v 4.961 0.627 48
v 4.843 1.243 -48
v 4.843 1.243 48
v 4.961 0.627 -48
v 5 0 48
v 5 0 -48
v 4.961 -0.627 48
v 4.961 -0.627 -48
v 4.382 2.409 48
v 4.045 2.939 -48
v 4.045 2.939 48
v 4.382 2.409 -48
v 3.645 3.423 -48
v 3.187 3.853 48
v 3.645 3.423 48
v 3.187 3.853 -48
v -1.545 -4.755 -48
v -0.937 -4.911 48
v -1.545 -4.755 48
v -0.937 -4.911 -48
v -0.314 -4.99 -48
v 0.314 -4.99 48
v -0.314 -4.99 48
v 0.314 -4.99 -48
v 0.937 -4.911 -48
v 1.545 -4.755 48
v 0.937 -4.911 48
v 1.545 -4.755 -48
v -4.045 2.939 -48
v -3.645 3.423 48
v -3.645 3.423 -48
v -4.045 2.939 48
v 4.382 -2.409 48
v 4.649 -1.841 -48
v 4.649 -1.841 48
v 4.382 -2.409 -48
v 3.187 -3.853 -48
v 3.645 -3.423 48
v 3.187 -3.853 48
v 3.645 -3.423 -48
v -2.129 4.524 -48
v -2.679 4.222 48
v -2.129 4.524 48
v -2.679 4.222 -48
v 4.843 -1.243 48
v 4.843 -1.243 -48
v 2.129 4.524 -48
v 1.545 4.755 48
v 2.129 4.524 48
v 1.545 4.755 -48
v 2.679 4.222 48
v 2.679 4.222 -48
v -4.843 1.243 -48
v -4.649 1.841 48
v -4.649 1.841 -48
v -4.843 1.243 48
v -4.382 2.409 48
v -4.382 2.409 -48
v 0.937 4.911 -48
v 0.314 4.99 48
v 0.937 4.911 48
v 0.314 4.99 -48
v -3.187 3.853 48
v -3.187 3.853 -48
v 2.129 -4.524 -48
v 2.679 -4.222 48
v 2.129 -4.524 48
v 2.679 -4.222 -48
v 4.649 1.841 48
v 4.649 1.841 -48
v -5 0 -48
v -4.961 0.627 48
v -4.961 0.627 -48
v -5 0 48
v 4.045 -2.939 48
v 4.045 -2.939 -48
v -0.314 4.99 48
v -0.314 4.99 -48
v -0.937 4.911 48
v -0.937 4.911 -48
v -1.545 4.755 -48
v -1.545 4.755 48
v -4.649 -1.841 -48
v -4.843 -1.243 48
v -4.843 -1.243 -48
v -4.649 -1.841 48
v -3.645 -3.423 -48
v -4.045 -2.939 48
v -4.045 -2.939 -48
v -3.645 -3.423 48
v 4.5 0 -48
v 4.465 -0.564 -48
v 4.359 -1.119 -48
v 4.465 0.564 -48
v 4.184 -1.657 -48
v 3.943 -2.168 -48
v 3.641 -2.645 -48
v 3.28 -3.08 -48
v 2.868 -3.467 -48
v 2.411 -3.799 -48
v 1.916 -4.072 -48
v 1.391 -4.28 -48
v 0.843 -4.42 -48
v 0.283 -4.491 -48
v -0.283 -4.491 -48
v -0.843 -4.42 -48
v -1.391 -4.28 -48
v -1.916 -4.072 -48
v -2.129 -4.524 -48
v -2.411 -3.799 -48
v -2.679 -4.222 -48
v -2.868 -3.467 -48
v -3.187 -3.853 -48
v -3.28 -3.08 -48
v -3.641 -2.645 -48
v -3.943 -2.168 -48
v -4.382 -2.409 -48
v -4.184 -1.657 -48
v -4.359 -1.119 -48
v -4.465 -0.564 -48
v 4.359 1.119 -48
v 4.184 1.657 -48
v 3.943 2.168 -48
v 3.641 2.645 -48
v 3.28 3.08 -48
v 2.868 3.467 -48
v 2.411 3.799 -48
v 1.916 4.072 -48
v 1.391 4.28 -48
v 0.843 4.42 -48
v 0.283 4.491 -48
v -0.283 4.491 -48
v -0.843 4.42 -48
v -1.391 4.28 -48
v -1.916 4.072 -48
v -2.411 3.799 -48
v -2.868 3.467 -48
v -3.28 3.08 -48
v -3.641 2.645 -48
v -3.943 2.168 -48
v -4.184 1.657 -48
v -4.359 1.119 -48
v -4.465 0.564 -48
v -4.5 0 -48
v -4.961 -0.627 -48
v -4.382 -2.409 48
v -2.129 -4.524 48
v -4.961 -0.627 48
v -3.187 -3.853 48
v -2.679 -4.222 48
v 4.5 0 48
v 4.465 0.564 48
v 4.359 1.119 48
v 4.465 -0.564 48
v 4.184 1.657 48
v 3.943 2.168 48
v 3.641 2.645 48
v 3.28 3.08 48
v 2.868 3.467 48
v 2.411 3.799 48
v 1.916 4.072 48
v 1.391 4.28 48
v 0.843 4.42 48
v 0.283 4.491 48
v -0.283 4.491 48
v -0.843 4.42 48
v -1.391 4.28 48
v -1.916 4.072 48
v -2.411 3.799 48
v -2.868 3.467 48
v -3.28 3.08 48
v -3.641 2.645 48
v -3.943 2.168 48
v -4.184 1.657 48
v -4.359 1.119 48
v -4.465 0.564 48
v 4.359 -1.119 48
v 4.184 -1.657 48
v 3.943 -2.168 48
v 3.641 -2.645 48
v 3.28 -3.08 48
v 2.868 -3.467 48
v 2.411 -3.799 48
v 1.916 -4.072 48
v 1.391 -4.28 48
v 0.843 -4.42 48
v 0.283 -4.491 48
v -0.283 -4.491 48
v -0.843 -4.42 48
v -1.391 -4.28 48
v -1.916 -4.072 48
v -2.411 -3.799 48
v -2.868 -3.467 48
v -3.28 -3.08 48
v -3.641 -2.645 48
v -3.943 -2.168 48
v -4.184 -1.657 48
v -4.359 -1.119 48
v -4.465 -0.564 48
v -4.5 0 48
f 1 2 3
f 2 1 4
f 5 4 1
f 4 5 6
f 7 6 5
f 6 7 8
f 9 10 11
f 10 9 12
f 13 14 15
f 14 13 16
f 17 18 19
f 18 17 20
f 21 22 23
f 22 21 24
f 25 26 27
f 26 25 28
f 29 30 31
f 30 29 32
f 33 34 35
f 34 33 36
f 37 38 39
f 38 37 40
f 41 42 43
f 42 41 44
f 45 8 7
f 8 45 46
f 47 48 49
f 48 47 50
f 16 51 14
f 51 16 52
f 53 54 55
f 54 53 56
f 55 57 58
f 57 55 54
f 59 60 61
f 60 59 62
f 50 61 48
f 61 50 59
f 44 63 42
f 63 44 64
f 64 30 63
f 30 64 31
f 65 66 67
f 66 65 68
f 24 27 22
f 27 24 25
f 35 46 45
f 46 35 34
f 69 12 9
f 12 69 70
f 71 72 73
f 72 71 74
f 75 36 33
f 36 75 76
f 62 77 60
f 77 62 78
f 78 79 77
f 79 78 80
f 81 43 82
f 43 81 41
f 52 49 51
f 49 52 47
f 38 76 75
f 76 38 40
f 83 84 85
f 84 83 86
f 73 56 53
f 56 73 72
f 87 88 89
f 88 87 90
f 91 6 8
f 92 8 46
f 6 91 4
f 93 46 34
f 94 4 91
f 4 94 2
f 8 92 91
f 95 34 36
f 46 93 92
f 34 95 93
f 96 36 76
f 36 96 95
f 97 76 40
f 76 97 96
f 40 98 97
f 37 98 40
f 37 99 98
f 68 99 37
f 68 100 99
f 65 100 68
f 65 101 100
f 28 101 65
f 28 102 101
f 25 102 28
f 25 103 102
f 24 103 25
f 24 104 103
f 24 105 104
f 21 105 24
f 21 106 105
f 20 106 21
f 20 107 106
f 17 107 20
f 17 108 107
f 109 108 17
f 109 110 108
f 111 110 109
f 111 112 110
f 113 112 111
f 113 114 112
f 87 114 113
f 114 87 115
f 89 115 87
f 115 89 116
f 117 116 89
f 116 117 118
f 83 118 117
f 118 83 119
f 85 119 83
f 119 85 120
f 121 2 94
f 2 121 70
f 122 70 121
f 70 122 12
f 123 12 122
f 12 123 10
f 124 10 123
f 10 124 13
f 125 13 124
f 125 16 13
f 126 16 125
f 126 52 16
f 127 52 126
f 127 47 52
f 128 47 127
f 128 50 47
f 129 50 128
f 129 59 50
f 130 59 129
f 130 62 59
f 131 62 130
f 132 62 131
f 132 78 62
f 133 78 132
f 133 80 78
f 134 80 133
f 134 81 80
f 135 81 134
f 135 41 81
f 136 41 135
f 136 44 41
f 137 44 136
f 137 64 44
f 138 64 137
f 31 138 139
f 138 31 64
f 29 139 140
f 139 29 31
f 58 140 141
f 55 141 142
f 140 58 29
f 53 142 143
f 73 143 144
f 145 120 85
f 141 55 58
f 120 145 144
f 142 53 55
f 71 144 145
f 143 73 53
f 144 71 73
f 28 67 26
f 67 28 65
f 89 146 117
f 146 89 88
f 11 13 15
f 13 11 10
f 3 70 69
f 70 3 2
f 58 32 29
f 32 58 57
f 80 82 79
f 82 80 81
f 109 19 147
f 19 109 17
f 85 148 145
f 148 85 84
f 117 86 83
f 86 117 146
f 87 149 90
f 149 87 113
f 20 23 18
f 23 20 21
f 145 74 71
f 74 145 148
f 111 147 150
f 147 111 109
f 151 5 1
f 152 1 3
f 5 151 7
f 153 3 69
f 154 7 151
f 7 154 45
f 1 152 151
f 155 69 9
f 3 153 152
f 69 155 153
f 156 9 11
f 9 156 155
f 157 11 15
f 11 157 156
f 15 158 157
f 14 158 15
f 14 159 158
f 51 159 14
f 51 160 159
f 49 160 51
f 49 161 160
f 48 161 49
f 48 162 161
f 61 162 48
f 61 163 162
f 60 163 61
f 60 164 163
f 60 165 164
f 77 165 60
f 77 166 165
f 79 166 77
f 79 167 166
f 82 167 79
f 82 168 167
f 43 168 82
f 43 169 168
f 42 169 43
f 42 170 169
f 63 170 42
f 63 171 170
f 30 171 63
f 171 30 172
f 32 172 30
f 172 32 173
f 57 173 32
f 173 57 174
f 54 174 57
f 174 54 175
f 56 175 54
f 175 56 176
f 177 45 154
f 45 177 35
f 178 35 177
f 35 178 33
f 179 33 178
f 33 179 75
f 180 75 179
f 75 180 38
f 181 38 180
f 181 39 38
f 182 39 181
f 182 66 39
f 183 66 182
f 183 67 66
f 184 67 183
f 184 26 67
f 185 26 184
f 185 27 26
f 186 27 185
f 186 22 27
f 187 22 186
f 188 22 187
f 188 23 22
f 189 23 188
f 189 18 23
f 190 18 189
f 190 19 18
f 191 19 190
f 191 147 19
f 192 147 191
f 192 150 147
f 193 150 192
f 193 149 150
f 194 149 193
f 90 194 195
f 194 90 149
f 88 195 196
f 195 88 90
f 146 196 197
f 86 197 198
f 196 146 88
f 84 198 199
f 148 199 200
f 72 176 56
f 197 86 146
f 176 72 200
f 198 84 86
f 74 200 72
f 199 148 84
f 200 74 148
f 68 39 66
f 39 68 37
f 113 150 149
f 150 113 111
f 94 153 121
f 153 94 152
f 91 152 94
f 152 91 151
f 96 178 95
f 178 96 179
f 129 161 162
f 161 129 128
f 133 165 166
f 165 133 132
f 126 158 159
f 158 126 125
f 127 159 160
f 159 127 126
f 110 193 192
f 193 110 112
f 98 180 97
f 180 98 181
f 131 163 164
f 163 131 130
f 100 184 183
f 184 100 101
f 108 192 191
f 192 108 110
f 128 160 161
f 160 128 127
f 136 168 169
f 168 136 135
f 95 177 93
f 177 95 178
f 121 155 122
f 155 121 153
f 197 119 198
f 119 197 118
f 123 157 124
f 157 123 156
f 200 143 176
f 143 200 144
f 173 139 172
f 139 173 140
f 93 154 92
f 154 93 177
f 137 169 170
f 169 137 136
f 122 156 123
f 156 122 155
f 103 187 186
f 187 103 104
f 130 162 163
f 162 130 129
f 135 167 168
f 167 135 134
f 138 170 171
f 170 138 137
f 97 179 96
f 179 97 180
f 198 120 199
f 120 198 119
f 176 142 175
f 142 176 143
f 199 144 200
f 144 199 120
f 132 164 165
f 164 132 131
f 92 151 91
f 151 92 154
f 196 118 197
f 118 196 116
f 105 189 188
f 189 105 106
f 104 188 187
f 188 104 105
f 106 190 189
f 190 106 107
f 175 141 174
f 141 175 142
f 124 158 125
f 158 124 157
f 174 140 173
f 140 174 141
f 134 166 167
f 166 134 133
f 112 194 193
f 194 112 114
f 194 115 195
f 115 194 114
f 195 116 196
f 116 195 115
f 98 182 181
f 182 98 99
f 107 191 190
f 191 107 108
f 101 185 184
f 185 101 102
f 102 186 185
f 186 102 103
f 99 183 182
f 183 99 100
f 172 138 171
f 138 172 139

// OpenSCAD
$fn = 50;


difference() {
	union() {
		translate(v = [0, 0, -48.0000000000]) {
			cylinder(h = 96, r = 5.0000000000);
		}
	}
	union() {
		translate(v = [0, 0, -100.0000000000]) {
			cylinder(h = 200, r = 4.5000000000);
		}
	}
}
